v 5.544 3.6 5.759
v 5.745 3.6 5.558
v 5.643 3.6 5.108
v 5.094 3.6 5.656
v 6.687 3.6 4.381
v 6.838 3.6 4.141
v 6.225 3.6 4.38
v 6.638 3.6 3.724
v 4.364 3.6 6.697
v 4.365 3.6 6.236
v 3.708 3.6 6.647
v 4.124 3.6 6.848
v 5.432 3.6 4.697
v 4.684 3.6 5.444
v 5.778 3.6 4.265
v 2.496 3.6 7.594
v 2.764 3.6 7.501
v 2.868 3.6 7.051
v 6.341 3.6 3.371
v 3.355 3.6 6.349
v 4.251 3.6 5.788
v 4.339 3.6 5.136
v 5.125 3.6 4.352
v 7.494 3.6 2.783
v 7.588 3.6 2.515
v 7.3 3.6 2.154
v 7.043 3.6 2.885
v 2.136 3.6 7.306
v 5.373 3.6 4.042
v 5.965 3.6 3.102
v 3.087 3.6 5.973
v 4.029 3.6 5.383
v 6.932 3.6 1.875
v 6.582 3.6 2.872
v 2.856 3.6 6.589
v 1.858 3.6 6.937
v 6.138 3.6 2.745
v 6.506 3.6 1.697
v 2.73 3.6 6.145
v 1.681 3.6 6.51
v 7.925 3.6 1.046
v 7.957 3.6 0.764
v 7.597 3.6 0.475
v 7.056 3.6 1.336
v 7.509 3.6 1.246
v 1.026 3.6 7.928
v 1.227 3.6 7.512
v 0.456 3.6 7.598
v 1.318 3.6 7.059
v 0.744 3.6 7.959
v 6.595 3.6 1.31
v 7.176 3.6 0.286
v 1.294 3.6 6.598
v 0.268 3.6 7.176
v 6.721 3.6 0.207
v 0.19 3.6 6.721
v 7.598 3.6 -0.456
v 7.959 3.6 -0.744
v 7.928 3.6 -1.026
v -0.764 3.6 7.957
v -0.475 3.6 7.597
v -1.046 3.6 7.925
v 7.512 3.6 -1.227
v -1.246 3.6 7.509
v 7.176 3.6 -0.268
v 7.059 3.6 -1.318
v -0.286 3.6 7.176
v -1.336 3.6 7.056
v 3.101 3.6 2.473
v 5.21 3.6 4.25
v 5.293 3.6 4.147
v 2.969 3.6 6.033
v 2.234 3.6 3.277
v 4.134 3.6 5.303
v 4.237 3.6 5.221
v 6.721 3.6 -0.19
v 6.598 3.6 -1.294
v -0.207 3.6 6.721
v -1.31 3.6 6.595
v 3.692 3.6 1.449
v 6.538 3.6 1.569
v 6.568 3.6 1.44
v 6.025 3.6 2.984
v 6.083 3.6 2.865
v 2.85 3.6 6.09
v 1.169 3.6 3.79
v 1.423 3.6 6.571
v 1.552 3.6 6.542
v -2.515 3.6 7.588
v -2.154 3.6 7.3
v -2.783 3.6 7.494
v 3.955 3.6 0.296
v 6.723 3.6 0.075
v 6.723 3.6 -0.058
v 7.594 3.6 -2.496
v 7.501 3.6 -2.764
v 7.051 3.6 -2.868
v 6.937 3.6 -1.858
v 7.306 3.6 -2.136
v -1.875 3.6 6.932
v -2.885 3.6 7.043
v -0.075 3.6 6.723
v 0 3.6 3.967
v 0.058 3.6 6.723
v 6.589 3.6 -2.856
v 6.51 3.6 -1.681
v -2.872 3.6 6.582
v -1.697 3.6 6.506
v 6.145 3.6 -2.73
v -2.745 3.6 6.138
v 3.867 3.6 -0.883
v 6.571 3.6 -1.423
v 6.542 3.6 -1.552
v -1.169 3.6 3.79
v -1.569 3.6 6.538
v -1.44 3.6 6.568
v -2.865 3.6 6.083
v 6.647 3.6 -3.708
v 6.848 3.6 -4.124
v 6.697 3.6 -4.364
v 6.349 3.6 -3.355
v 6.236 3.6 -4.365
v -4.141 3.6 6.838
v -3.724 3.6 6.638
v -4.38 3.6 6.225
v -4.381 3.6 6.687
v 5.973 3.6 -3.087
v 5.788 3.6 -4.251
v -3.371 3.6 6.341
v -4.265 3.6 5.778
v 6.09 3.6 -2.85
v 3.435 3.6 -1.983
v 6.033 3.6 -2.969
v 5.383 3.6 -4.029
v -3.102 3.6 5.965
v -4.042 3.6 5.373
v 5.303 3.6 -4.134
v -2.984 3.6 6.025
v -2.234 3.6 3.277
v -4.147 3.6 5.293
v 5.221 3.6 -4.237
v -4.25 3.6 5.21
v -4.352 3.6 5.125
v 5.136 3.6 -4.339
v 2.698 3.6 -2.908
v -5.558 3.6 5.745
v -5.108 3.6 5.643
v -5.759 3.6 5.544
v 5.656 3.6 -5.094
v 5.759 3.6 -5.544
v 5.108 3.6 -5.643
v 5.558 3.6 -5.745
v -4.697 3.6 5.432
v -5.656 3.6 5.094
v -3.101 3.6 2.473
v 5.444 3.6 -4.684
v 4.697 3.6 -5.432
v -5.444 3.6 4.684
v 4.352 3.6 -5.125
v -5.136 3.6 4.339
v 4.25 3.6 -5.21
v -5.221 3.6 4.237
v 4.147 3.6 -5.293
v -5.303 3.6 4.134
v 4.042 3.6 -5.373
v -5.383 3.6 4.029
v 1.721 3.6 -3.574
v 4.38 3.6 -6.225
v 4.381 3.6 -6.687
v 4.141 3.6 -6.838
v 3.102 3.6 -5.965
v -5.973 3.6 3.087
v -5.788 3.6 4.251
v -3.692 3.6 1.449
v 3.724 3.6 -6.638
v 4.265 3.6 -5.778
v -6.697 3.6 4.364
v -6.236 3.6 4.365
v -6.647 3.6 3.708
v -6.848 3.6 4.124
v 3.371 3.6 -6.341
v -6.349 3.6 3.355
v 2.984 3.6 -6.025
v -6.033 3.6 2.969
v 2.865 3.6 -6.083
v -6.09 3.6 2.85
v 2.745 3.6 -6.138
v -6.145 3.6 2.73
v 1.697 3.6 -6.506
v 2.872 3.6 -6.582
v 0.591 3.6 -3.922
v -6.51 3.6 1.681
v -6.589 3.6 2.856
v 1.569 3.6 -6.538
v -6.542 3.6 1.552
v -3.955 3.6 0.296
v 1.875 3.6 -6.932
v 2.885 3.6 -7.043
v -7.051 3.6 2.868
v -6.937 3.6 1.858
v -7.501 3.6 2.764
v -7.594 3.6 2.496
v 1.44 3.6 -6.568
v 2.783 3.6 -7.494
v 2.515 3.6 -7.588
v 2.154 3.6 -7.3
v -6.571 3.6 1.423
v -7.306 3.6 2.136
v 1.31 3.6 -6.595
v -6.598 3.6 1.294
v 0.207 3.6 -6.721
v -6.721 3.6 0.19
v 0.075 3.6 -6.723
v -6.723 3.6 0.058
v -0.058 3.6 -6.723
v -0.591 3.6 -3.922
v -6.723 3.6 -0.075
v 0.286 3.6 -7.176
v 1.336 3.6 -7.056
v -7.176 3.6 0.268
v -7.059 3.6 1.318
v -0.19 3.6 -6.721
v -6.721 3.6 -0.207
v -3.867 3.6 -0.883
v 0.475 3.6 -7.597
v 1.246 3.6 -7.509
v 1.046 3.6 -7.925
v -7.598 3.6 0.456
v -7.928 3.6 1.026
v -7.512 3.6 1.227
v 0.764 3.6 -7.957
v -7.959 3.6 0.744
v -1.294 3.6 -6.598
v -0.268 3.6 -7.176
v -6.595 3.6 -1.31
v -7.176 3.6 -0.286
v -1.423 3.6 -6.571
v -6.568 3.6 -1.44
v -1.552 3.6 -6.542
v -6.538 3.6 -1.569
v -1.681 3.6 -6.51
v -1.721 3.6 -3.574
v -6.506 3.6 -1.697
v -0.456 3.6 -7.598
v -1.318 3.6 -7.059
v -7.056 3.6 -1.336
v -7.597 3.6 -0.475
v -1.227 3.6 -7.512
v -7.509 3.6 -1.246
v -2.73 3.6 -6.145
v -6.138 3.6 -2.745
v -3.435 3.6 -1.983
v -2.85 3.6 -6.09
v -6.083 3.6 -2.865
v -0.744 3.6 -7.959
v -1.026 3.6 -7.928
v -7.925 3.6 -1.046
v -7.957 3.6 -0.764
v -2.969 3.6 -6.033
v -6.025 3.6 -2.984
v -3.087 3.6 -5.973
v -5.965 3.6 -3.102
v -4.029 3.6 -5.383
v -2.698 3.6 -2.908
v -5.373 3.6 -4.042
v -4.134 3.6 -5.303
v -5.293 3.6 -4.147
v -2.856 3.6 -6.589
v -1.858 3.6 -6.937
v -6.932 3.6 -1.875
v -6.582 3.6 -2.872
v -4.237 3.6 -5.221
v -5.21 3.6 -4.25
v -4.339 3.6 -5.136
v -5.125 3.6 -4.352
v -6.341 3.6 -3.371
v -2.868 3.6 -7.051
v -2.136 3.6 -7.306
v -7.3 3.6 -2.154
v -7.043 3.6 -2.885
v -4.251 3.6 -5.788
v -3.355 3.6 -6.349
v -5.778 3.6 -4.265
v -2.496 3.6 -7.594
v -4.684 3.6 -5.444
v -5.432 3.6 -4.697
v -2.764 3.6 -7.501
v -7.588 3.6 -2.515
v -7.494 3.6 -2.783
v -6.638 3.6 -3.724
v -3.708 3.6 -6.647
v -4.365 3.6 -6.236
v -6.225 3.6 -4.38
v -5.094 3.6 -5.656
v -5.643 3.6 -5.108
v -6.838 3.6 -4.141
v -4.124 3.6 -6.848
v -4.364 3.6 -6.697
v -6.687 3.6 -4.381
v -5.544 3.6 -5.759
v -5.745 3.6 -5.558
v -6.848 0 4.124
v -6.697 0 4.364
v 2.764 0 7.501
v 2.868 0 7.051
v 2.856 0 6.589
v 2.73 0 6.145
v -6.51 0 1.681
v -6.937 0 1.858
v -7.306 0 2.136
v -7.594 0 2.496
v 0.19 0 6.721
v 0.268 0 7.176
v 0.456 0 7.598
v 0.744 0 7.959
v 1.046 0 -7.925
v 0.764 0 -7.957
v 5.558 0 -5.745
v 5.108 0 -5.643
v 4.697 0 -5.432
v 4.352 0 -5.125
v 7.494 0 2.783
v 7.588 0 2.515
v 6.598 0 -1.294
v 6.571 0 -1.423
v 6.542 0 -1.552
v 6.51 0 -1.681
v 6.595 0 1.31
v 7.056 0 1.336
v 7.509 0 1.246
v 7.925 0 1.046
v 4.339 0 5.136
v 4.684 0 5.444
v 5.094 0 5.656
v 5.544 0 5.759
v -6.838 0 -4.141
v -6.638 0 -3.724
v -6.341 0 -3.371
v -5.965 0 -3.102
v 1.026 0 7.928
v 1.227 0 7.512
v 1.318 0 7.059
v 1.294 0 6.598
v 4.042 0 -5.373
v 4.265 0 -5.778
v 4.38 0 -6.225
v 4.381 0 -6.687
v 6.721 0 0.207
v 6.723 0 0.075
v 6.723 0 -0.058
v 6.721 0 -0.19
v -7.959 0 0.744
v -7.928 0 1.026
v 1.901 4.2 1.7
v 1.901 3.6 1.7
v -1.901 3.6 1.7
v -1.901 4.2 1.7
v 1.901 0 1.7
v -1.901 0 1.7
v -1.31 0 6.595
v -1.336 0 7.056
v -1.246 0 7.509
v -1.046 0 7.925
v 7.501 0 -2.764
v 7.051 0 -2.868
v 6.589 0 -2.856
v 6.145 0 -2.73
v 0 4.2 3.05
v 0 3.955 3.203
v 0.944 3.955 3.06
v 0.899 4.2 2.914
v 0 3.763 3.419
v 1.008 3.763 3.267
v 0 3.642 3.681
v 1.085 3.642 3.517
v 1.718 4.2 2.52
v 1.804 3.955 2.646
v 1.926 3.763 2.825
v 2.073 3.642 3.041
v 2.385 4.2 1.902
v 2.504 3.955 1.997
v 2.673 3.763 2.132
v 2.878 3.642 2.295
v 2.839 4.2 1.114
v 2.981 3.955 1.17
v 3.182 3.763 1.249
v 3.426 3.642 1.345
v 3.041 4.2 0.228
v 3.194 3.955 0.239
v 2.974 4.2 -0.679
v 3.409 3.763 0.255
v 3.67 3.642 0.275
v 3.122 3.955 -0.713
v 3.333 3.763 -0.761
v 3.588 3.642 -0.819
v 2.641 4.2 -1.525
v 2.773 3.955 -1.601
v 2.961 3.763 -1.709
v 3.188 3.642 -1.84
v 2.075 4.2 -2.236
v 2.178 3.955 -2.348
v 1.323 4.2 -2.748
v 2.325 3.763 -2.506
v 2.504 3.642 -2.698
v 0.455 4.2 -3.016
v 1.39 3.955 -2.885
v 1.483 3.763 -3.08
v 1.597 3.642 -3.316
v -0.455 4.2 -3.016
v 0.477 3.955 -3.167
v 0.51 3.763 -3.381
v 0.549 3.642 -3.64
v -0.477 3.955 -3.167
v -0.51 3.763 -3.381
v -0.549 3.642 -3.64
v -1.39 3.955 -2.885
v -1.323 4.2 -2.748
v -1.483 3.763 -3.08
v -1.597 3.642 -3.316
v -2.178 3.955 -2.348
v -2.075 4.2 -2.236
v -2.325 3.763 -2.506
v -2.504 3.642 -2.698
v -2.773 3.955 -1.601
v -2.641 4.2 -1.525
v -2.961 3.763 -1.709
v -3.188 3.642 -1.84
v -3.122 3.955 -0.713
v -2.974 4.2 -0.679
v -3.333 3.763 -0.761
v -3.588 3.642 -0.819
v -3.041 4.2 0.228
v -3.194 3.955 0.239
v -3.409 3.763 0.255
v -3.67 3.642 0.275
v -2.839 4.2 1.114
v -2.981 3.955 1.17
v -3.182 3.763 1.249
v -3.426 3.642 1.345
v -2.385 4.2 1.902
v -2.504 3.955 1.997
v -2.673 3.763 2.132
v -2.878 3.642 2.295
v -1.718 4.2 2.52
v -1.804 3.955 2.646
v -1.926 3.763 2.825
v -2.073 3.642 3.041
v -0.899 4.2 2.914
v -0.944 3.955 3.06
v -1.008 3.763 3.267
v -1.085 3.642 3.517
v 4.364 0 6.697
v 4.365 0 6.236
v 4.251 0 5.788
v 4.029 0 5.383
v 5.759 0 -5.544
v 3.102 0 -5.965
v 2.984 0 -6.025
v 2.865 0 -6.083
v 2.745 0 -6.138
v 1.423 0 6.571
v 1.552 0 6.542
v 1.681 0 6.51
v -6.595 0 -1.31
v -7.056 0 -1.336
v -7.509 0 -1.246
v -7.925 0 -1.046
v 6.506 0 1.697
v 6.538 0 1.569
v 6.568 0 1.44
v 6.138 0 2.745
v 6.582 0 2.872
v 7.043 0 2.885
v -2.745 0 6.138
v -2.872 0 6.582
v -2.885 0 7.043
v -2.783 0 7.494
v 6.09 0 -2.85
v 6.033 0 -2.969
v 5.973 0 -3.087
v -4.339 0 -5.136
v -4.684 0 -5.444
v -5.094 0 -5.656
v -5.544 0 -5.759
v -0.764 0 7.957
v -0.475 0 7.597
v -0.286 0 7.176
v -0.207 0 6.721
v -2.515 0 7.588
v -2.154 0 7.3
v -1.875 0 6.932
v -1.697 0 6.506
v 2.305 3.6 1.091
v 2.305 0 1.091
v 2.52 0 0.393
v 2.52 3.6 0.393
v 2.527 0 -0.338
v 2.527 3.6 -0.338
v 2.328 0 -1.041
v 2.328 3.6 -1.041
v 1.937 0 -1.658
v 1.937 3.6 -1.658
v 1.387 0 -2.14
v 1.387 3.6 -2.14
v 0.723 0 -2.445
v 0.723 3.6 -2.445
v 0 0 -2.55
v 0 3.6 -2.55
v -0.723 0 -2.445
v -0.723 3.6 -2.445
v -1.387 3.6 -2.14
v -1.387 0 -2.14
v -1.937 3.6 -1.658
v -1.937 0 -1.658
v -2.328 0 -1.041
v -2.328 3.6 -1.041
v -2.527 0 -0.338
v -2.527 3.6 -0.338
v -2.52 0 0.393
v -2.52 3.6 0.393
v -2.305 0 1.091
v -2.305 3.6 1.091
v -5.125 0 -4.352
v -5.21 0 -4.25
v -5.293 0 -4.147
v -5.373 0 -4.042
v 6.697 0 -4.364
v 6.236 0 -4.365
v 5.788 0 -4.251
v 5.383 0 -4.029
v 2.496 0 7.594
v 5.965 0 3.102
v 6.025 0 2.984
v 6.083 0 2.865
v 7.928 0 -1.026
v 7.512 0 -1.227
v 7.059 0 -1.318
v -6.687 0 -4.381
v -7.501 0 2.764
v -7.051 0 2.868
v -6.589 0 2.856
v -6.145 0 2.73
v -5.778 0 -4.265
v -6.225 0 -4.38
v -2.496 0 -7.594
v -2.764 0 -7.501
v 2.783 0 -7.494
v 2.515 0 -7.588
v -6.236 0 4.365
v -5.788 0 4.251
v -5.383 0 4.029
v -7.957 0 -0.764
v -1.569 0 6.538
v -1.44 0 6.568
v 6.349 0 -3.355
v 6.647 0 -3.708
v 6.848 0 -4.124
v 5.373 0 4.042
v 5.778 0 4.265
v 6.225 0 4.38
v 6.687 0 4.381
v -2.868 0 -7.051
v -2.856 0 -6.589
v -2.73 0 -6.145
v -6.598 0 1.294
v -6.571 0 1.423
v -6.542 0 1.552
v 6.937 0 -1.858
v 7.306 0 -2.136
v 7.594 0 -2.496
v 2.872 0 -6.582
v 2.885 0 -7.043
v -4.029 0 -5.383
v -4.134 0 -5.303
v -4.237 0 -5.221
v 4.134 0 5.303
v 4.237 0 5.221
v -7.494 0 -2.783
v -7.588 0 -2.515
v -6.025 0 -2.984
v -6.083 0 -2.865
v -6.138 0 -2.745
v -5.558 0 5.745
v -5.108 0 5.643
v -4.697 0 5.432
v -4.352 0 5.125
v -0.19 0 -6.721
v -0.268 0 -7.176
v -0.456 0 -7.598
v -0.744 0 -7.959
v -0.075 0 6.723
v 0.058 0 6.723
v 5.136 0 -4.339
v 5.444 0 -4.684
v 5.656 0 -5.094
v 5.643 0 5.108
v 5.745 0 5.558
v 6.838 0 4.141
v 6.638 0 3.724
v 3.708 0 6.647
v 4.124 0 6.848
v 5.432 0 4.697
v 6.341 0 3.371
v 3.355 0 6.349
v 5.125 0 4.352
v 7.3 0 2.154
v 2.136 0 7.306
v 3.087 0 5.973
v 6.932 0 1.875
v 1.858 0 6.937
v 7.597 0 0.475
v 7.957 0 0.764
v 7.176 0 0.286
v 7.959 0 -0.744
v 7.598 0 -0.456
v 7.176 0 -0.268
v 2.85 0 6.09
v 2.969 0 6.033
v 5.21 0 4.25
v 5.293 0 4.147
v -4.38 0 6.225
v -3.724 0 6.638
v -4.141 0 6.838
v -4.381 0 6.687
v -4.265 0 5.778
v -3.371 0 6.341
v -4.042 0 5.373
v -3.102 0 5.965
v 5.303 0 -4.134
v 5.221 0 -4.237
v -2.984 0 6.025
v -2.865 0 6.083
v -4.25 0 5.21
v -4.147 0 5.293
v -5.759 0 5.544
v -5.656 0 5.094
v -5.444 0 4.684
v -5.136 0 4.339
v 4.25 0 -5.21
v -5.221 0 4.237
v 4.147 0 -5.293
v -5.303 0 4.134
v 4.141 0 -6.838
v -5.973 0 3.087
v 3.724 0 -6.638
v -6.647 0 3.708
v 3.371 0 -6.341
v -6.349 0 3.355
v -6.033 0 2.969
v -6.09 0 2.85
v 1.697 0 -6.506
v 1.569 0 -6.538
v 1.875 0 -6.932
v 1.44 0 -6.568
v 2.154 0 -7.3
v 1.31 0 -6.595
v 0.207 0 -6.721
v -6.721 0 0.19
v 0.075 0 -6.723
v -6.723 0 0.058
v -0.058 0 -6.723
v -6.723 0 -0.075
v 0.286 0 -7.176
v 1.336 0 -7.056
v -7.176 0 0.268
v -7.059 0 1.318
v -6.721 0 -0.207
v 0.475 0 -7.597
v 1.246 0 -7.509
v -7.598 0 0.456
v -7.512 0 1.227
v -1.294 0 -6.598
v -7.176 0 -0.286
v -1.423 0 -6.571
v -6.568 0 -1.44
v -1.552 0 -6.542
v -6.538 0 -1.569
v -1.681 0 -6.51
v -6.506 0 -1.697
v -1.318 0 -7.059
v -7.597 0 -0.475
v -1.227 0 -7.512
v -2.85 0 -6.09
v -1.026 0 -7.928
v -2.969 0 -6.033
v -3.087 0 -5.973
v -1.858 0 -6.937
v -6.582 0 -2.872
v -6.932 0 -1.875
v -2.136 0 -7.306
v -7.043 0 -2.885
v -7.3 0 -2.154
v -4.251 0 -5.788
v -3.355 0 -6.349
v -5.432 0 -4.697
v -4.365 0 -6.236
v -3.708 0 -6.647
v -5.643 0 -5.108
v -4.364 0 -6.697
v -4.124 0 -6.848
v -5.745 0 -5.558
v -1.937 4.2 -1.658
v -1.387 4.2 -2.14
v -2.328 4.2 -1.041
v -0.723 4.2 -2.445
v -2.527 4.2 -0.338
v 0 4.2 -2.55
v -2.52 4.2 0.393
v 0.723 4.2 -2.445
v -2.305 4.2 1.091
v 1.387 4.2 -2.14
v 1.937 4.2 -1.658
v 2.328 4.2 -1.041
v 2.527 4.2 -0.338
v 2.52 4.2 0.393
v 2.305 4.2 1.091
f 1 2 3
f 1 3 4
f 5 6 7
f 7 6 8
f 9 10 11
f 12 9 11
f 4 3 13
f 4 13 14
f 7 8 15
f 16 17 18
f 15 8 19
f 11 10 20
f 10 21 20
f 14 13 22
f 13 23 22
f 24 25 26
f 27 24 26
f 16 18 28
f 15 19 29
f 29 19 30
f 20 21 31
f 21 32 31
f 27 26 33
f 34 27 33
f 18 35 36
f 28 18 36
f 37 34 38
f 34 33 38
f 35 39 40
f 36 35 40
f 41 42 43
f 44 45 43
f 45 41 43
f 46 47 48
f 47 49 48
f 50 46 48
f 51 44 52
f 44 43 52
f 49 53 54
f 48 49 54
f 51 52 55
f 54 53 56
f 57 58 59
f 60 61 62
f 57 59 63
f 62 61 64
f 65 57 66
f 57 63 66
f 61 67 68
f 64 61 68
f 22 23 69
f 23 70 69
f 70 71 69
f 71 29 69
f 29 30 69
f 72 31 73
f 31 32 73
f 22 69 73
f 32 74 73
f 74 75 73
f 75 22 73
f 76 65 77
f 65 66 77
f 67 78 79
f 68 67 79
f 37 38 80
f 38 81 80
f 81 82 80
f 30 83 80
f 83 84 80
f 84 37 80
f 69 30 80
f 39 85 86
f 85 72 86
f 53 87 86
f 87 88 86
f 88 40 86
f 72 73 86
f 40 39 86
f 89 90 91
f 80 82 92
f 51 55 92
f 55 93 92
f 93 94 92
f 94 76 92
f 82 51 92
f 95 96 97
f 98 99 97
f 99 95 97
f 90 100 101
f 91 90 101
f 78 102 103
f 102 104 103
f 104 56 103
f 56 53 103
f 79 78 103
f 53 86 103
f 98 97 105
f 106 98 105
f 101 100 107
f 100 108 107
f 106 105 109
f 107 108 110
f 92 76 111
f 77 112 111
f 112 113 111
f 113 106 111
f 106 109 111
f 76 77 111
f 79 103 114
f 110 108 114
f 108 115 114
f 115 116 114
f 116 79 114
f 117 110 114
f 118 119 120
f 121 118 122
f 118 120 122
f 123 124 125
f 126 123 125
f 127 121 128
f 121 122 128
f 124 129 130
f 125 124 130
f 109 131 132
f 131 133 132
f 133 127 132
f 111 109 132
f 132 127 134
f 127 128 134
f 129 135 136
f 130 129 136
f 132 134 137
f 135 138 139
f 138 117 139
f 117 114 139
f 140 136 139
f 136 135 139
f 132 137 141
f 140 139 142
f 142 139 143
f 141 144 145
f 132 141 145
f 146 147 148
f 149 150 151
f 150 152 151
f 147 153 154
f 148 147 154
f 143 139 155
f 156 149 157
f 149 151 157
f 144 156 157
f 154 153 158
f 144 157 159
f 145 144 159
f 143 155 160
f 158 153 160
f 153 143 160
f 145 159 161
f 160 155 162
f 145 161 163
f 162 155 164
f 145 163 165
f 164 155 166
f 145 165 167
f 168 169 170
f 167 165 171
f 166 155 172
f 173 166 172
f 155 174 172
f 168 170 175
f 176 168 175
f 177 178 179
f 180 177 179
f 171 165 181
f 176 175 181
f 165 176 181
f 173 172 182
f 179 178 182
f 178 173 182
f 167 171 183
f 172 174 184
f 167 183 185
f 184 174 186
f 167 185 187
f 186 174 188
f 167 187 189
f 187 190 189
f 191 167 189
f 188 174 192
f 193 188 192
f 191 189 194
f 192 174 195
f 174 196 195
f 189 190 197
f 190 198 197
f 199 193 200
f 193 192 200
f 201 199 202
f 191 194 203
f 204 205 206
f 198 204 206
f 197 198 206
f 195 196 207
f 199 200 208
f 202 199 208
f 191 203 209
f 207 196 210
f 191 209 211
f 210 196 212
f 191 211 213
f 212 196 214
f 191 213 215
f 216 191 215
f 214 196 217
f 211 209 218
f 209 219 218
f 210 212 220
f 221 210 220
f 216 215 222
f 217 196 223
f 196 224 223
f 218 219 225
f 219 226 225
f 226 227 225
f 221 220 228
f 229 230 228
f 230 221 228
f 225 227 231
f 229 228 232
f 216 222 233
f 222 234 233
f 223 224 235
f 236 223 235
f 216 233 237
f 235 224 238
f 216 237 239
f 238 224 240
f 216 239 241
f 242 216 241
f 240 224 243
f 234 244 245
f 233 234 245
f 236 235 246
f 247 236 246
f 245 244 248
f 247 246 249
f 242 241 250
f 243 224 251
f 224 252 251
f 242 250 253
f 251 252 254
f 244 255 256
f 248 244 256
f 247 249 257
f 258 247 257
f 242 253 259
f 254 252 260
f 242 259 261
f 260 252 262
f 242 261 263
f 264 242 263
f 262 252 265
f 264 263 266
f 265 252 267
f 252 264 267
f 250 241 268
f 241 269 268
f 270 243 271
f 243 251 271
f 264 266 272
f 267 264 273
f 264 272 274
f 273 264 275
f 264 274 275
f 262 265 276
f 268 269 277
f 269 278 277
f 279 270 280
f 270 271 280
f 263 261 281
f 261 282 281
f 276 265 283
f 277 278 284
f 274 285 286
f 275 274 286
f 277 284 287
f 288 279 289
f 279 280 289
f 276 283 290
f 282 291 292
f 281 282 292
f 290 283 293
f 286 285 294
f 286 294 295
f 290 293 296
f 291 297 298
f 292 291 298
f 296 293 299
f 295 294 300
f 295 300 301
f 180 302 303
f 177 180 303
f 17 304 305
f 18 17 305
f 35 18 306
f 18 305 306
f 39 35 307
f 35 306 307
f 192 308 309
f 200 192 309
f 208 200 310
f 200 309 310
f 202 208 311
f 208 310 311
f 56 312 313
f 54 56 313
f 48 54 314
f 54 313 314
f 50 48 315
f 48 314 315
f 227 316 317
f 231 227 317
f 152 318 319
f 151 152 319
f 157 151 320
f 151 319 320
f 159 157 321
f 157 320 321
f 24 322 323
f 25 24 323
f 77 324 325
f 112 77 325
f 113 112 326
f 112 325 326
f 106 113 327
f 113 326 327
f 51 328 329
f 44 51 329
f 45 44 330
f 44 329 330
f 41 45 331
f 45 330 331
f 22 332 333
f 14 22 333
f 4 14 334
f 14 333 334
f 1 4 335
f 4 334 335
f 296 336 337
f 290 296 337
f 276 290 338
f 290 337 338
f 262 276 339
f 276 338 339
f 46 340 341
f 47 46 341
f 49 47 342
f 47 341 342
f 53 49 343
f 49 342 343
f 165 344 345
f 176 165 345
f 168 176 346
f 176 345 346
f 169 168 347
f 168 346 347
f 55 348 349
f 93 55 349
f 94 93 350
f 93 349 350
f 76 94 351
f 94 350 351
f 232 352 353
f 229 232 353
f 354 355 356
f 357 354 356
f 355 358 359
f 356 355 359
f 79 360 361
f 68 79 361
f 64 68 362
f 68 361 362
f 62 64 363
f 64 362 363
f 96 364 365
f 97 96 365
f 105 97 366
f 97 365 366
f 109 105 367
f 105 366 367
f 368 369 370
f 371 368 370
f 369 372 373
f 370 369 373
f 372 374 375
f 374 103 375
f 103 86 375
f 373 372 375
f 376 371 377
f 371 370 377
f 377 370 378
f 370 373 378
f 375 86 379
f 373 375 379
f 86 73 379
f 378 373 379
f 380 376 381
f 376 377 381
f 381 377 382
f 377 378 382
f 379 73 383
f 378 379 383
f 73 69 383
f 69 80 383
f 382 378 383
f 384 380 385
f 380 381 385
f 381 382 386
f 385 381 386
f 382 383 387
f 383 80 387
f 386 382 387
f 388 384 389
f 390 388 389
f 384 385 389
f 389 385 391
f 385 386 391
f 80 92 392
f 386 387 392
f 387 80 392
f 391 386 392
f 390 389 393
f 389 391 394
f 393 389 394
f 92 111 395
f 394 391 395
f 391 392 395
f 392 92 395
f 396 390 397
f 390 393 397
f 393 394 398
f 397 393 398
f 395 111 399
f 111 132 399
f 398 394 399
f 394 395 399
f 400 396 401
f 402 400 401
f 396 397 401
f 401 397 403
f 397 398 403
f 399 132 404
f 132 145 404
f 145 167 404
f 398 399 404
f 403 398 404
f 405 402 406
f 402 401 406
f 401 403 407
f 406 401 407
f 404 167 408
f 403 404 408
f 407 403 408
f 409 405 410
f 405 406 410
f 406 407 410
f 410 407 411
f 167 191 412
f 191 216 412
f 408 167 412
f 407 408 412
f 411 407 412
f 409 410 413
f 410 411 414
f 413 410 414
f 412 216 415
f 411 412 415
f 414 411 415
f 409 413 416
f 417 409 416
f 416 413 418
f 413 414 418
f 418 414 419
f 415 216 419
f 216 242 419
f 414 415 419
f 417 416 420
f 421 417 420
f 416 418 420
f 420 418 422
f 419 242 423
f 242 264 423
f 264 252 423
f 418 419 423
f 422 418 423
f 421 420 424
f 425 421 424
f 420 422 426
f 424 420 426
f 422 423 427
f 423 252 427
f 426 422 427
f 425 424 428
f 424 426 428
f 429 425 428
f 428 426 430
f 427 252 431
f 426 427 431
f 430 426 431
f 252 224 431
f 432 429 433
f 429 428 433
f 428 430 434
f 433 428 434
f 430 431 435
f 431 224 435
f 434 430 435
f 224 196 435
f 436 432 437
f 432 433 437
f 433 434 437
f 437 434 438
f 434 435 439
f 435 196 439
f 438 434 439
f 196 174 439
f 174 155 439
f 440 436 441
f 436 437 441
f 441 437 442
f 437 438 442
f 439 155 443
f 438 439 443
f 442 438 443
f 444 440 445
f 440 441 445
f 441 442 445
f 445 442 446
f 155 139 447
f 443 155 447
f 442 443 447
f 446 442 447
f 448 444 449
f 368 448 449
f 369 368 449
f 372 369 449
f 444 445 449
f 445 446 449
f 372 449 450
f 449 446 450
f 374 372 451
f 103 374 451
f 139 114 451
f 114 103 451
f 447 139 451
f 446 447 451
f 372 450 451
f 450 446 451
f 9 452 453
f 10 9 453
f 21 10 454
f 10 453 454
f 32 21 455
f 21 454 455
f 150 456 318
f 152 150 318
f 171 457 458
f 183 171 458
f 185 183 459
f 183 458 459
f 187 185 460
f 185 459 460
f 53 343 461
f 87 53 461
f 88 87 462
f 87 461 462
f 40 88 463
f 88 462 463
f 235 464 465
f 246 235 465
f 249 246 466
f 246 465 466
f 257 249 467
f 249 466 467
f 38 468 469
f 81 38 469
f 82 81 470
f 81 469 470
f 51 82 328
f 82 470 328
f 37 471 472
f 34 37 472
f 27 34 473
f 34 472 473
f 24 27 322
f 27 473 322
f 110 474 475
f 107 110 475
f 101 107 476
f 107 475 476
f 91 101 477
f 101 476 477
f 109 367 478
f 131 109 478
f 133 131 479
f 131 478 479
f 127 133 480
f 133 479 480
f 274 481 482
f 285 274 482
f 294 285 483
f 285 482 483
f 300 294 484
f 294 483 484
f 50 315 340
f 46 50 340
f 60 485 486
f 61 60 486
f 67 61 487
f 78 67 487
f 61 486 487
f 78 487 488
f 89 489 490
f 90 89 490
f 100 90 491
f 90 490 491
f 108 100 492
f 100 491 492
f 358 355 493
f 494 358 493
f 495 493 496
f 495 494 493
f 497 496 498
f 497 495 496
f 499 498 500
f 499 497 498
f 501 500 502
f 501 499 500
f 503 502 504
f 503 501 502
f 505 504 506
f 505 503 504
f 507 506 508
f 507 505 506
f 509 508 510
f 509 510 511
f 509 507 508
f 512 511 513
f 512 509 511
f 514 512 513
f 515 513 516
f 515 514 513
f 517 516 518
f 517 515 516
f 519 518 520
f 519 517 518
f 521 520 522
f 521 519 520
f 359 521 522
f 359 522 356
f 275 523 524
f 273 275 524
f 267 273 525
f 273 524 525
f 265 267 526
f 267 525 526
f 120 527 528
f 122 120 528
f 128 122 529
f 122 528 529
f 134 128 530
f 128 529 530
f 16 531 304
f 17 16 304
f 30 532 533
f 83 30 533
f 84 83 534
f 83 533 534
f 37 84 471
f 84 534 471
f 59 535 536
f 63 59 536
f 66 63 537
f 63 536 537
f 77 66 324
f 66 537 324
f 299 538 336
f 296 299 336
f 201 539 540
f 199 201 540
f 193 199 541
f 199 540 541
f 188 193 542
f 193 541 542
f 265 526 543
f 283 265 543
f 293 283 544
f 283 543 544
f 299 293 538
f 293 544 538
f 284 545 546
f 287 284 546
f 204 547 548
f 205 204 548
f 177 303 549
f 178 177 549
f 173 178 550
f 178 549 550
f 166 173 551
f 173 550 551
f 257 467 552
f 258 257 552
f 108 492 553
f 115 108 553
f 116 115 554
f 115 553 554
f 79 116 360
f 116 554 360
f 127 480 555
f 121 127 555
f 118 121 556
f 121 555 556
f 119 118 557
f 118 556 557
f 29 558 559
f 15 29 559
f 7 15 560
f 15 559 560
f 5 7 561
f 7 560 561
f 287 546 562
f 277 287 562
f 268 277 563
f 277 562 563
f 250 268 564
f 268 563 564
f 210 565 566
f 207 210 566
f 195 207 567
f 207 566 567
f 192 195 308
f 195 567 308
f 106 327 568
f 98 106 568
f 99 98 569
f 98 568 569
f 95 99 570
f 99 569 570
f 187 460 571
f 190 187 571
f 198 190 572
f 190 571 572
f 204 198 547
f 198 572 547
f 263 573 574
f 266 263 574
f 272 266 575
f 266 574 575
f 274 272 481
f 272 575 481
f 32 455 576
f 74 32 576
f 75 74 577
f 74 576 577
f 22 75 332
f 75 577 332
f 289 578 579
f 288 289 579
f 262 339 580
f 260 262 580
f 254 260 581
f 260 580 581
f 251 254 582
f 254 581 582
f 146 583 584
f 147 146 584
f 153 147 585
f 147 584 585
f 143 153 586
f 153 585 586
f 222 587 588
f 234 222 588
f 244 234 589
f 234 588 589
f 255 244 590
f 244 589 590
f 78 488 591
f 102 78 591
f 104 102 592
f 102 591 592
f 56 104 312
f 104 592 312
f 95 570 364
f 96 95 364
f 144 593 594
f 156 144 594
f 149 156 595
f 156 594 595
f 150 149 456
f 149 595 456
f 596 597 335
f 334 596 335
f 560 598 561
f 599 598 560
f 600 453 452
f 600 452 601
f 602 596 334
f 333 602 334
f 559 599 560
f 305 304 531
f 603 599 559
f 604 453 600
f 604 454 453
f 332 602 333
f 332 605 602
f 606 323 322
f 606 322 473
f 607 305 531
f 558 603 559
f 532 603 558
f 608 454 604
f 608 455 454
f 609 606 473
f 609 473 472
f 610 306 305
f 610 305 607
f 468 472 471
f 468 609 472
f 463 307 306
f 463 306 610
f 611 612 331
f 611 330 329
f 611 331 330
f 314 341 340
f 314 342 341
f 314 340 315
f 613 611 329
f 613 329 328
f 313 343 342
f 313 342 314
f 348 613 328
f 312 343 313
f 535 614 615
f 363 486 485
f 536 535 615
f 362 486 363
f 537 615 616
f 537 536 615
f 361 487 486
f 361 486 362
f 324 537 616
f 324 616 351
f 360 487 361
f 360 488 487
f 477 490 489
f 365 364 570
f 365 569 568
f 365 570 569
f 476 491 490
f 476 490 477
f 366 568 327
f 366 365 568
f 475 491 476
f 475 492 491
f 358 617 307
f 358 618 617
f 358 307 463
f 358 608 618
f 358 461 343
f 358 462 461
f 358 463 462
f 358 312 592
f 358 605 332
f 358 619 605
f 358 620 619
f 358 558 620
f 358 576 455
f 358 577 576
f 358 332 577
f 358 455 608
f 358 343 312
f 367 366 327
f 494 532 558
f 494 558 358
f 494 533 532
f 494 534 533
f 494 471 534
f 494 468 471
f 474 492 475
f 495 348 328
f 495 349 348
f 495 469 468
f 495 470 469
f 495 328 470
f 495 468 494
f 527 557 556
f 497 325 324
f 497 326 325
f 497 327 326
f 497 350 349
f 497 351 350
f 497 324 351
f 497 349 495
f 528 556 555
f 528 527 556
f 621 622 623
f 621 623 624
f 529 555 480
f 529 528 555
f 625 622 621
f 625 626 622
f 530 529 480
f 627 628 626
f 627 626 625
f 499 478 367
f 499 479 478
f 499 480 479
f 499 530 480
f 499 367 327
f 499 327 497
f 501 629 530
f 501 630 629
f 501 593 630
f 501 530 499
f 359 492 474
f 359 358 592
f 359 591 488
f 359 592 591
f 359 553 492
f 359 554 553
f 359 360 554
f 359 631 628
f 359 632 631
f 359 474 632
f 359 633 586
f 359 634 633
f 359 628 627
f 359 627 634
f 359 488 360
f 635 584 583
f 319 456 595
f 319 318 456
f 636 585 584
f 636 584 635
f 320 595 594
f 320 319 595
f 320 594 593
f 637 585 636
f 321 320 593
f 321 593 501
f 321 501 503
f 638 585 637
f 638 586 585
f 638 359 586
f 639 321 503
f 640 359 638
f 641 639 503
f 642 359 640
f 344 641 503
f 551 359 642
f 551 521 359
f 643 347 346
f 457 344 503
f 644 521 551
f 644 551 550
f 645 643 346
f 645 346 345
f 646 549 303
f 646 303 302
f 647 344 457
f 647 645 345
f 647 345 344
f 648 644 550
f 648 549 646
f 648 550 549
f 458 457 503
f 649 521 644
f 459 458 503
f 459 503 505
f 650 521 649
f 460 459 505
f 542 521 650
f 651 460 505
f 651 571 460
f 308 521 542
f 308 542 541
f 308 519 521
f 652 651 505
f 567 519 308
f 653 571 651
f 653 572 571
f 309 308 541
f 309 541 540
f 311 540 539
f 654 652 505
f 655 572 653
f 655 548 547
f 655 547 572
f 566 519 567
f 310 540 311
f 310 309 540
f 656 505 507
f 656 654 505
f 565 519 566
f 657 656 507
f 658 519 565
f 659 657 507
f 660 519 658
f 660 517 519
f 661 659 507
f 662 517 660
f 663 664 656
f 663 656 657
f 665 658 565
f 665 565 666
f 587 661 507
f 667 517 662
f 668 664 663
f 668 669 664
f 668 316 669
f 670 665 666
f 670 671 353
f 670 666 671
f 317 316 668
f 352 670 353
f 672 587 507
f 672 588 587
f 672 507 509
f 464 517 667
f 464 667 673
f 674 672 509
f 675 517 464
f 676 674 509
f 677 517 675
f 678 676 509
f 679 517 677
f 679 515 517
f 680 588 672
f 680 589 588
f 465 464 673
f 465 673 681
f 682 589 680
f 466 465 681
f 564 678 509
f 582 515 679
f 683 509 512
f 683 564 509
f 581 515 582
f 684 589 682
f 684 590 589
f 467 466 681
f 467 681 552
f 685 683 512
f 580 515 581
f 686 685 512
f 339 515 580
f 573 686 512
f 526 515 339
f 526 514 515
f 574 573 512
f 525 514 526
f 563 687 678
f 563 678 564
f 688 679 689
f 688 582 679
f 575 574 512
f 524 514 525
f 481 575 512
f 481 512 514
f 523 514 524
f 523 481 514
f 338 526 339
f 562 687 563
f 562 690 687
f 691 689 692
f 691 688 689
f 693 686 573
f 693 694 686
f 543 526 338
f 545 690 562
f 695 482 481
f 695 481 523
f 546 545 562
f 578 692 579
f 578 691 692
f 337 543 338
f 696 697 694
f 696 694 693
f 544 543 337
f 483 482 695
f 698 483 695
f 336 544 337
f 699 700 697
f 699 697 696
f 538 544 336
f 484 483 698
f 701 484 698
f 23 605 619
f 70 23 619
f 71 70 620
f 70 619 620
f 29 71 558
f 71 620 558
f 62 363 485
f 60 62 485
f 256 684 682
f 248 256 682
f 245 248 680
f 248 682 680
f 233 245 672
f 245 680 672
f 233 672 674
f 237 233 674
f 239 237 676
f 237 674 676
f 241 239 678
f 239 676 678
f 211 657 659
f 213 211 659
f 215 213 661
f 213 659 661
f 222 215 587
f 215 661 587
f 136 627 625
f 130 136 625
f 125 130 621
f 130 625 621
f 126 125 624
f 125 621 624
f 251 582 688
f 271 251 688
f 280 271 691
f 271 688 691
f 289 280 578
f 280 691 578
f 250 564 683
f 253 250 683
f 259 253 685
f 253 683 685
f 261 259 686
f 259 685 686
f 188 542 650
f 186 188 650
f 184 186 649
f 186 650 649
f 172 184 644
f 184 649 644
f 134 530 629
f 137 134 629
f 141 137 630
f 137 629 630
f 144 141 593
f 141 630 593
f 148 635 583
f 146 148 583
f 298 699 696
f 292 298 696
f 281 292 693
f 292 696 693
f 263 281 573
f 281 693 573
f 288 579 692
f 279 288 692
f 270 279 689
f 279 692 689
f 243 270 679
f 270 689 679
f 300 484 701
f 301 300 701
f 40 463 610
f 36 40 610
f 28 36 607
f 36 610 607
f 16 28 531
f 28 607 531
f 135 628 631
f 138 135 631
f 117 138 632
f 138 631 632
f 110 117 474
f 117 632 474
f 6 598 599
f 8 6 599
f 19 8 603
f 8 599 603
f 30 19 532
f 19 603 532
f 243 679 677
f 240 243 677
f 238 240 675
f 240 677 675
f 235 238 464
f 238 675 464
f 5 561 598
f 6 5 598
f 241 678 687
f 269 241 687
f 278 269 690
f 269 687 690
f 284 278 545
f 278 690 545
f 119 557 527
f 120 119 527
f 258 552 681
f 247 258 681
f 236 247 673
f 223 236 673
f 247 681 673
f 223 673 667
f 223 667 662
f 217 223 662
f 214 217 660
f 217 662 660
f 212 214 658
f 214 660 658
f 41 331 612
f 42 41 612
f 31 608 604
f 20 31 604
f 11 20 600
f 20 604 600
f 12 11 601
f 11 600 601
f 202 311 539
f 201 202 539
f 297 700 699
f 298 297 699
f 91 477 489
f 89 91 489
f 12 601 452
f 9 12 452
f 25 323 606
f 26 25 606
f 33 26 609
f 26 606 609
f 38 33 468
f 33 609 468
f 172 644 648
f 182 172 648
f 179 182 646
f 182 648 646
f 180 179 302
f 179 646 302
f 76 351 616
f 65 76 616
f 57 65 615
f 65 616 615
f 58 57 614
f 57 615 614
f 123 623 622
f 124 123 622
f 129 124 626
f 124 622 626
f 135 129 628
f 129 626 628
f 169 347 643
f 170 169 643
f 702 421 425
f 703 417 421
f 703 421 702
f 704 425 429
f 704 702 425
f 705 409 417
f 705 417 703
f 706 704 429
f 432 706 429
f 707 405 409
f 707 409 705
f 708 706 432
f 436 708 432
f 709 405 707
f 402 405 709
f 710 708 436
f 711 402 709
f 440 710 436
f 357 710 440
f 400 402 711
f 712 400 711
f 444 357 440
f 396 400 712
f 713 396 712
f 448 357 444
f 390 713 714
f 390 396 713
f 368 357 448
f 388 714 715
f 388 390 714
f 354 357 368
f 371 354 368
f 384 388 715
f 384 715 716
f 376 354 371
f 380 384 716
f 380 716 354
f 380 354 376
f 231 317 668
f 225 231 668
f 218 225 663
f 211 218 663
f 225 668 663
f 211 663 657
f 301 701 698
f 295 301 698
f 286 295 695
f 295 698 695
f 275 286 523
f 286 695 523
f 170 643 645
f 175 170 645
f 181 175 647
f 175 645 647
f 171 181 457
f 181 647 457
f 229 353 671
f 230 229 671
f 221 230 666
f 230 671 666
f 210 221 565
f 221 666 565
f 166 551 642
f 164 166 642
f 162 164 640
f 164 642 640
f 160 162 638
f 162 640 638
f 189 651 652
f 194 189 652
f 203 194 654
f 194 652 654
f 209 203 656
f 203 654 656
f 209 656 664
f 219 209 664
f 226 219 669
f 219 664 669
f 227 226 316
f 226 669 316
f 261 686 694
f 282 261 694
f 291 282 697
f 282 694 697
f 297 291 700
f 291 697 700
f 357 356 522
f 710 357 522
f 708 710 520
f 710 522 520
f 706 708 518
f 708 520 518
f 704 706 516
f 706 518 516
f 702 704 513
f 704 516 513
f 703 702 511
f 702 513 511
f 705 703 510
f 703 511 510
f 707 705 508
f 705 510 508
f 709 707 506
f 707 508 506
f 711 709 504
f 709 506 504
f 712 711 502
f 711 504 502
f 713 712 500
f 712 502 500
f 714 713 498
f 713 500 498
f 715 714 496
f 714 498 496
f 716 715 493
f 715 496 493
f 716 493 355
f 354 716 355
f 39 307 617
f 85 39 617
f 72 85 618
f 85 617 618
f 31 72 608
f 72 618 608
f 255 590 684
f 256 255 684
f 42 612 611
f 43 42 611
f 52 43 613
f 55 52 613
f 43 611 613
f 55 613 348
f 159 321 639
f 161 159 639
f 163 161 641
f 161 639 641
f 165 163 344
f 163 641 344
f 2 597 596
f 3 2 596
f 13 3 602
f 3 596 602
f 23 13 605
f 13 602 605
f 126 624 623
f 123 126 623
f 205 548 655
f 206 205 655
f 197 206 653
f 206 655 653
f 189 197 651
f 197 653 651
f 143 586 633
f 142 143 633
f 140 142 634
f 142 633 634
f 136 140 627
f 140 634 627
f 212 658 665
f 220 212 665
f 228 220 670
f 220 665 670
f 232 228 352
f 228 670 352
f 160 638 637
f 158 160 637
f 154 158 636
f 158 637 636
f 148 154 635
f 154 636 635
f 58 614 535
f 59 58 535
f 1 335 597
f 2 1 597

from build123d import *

# Parameters (mm, degrees)
SKETCH1_R           = 2.55
BOSS_EXTRUDE2_DEPTH = 3.6
BOSS_EXTRUDE3_START = -3.6
BOSS_EXTRUDE3_DEPTH = 3.6
SKETCH5_R           = 3.05
BOSS_EXTRUDE6_DEPTH = 0.6
FILLET3_R           = 1


with BuildPart() as part:
    # Sketch1 → Boss-Extrude2 (new body)
    with BuildSketch(Plane(origin=(0, 0, 0), x_dir=(1, 0, 0), z_dir=(0, 1, 0))):
        with BuildLine():
            ThreePointArc((3.087277962, -5.973051053), (3.521946978, -6.509464465), (4.123690803, -6.847962431))
            Line((4.123690803, -6.847962431), (4.363885613, -6.697456058))
            ThreePointArc((4.363885613, -6.697456058), (4.321717278, -6.00832738), (4.02858155, -5.38322903))
            ThreePointArc((4.02858155, -5.38322903), (4.185613137, -5.262059175), (4.339002356, -5.136310217))
            ThreePointArc((4.339002356, -5.136310217), (4.882136527, -5.56255167), (5.544116261, -5.758662187))
            Line((5.544116261, -5.758662187), (5.744798067, -5.55848095))
            ThreePointArc((5.744798067, -5.55848095), (5.550341423, -4.896013504), (5.125457751, -4.35181651))
            ThreePointArc((5.125457751, -4.35181651), (5.251589399, -4.198741821), (5.373151055, -4.042013339))
            ThreePointArc((5.373151055, -4.042013339), (5.997515364, -4.336709306), (6.686536579, -4.380598575))
            Line((6.686536579, -4.380598575), (6.837642357, -4.140780396))
            ThreePointArc((6.837642357, -4.140780396), (6.500648273, -3.538193066), (5.965322098, -3.102185738))
            ThreePointArc((5.965322098, -3.102185738), (6.05422904, -2.924882019), (6.137867523, -2.745033035))
            ThreePointArc((6.137867523, -2.745033035), (6.812153737, -2.893406229), (7.493666033, -2.782873458))
            Line((7.493666033, -2.782873458), (7.587618709, -2.515443823))
            ThreePointArc((7.587618709, -2.515443823), (7.124985474, -2.002952854), (6.506060286, -1.696998421))
            ThreePointArc((6.506060286, -1.696998421), (6.553284356, -1.50435642), (6.594805684, -1.310405312))
            ThreePointArc((6.594805684, -1.310405312), (7.285202277, -1.305015683), (7.925031781, -1.045603446))
            Line((7.925031781, -1.045603446), (7.957120175, -0.763972393))
            ThreePointArc((7.957120175, -0.763972393), (7.392046152, -0.367276222), (6.720557445, -0.206716516))
            ThreePointArc((6.720557445, -0.206716516), (6.723730631, -0.008396108), (6.721052751, 0.189931605))
            ThreePointArc((6.721052751, 0.189931605), (7.392940354, 0.3488138), (7.959003343, 0.744097489))
            Line((7.959003343, 0.744097489), (7.927618409, 1.025807803))
            ThreePointArc((7.927618409, 1.025807803), (7.28843877, 1.286817174), (6.598057791, 1.293931018))
            ThreePointArc((6.598057791, 1.293931018), (6.557020976, 1.487985219), (6.510278168, 1.680744559))
            ThreePointArc((6.510278168, 1.680744559), (7.129965532, 1.985152302), (7.593877244, 2.496486269))
            Line((7.593877244, 2.496486269), (7.500592754, 2.764149712))
            ThreePointArc((7.500592754, 2.764149712), (6.819358634, 2.876384183), (6.144703968, 2.729695448))
            ThreePointArc((6.144703968, 2.729695448), (6.061514909, 2.909752755), (5.973051053, 3.087277962))
            ThreePointArc((5.973051053, 3.087277962), (6.509464465, 3.521946978), (6.847962431, 4.123690803))
            Line((6.847962431, 4.123690803), (6.697456058, 4.363885613))
            ThreePointArc((6.697456058, 4.363885613), (6.00832738, 4.321717278), (5.38322903, 4.02858155))
            ThreePointArc((5.38322903, 4.02858155), (5.262059175, 4.185613137), (5.136310217, 4.339002356))
            ThreePointArc((5.136310217, 4.339002356), (5.56255167, 4.882136527), (5.758662187, 5.544116261))
            Line((5.758662187, 5.544116261), (5.55848095, 5.744798067))
            ThreePointArc((5.55848095, 5.744798067), (4.896013504, 5.550341423), (4.35181651, 5.125457751))
            ThreePointArc((4.35181651, 5.125457751), (4.198741821, 5.251589399), (4.042013339, 5.373151055))
            ThreePointArc((4.042013339, 5.373151055), (4.336709306, 5.997515364), (4.380598575, 6.686536579))
            Line((4.380598575, 6.686536579), (4.140780396, 6.837642357))
            ThreePointArc((4.140780396, 6.837642357), (3.538193066, 6.500648273), (3.102185738, 5.965322098))
            ThreePointArc((3.102185738, 5.965322098), (2.924882019, 6.05422904), (2.745033035, 6.137867523))
            ThreePointArc((2.745033035, 6.137867523), (2.893406229, 6.812153737), (2.782873458, 7.493666033))
            Line((2.782873458, 7.493666033), (2.515443823, 7.587618709))
            ThreePointArc((2.515443823, 7.587618709), (2.002952854, 7.124985474), (1.696998421, 6.506060286))
            ThreePointArc((1.696998421, 6.506060286), (1.50435642, 6.553284356), (1.310405312, 6.594805684))
            ThreePointArc((1.310405312, 6.594805684), (1.305015683, 7.285202277), (1.045603446, 7.925031781))
            Line((1.045603446, 7.925031781), (0.763972393, 7.957120175))
            ThreePointArc((0.763972393, 7.957120175), (0.367276222, 7.392046152), (0.206716516, 6.720557445))
            ThreePointArc((0.206716516, 6.720557445), (0.008396108, 6.723730631), (-0.189931605, 6.721052751))
            ThreePointArc((-0.189931605, 6.721052751), (-0.3488138, 7.392940354), (-0.744097489, 7.959003343))
            Line((-0.744097489, 7.959003343), (-1.025807803, 7.927618409))
            ThreePointArc((-1.025807803, 7.927618409), (-1.286817174, 7.28843877), (-1.293931018, 6.598057791))
            ThreePointArc((-1.293931018, 6.598057791), (-1.487985219, 6.557020976), (-1.680744559, 6.510278168))
            ThreePointArc((-1.680744559, 6.510278168), (-1.985152302, 7.129965532), (-2.496486269, 7.593877244))
            Line((-2.496486269, 7.593877244), (-2.764149712, 7.500592754))
            ThreePointArc((-2.764149712, 7.500592754), (-2.876384183, 6.819358634), (-2.729695448, 6.144703968))
            ThreePointArc((-2.729695448, 6.144703968), (-2.909752755, 6.061514909), (-3.087277962, 5.973051053))
            ThreePointArc((-3.087277962, 5.973051053), (-3.521946978, 6.509464465), (-4.123690803, 6.847962431))
            Line((-4.123690803, 6.847962431), (-4.363885613, 6.697456058))
            ThreePointArc((-4.363885613, 6.697456058), (-4.321717278, 6.00832738), (-4.02858155, 5.38322903))
            ThreePointArc((-4.02858155, 5.38322903), (-4.185613137, 5.262059175), (-4.339002356, 5.136310217))
            ThreePointArc((-4.339002356, 5.136310217), (-4.882136527, 5.56255167), (-5.544116261, 5.758662187))
            Line((-5.544116261, 5.758662187), (-5.744798067, 5.55848095))
            ThreePointArc((-5.744798067, 5.55848095), (-5.550341423, 4.896013504), (-5.125457751, 4.35181651))
            ThreePointArc((-5.125457751, 4.35181651), (-5.251589399, 4.198741821), (-5.373151055, 4.042013339))
            ThreePointArc((-5.373151055, 4.042013339), (-5.997515364, 4.336709306), (-6.686536579, 4.380598575))
            Line((-6.686536579, 4.380598575), (-6.837642357, 4.140780396))
            ThreePointArc((-6.837642357, 4.140780396), (-6.500648273, 3.538193066), (-5.965322098, 3.102185738))
            ThreePointArc((-5.965322098, 3.102185738), (-6.05422904, 2.924882019), (-6.137867523, 2.745033035))
            ThreePointArc((-6.137867523, 2.745033035), (-6.812153737, 2.893406229), (-7.493666033, 2.782873458))
            Line((-7.493666033, 2.782873458), (-7.587618709, 2.515443823))
            ThreePointArc((-7.587618709, 2.515443823), (-7.124985474, 2.002952854), (-6.506060286, 1.696998421))
            ThreePointArc((-6.506060286, 1.696998421), (-6.553284356, 1.50435642), (-6.594805684, 1.310405312))
            ThreePointArc((-6.594805684, 1.310405312), (-7.285202277, 1.305015683), (-7.925031781, 1.045603446))
            Line((-7.925031781, 1.045603446), (-7.957120175, 0.763972393))
            ThreePointArc((-7.957120175, 0.763972393), (-7.392046152, 0.367276222), (-6.720557445, 0.206716516))
            ThreePointArc((-6.720557445, 0.206716516), (-6.723730631, 0.008396108), (-6.721052751, -0.189931605))
            ThreePointArc((-6.721052751, -0.189931605), (-7.392940354, -0.3488138), (-7.959003343, -0.744097489))
            Line((-7.959003343, -0.744097489), (-7.927618409, -1.025807803))
            ThreePointArc((-7.927618409, -1.025807803), (-7.28843877, -1.286817174), (-6.598057791, -1.293931018))
            ThreePointArc((-6.598057791, -1.293931018), (-6.557020976, -1.487985219), (-6.510278168, -1.680744559))
            ThreePointArc((-6.510278168, -1.680744559), (-7.129965532, -1.985152302), (-7.593877244, -2.496486269))
            Line((-7.593877244, -2.496486269), (-7.500592754, -2.764149712))
            ThreePointArc((-7.500592754, -2.764149712), (-6.819358634, -2.876384183), (-6.144703968, -2.729695448))
            ThreePointArc((-6.144703968, -2.729695448), (-6.061514909, -2.909752755), (-5.973051053, -3.087277962))
            ThreePointArc((-5.973051053, -3.087277962), (-6.509464465, -3.521946978), (-6.847962431, -4.123690803))
            Line((-6.847962431, -4.123690803), (-6.697456058, -4.363885613))
            ThreePointArc((-6.697456058, -4.363885613), (-6.00832738, -4.321717278), (-5.38322903, -4.02858155))
            ThreePointArc((-5.38322903, -4.02858155), (-5.262059175, -4.185613137), (-5.136310217, -4.339002356))
            ThreePointArc((-5.136310217, -4.339002356), (-5.56255167, -4.882136527), (-5.758662187, -5.544116261))
            Line((-5.758662187, -5.544116261), (-5.55848095, -5.744798067))
            ThreePointArc((-5.55848095, -5.744798067), (-4.896013504, -5.550341423), (-4.35181651, -5.125457751))
            ThreePointArc((-4.35181651, -5.125457751), (-4.198741821, -5.251589399), (-4.042013339, -5.373151055))
            ThreePointArc((-4.042013339, -5.373151055), (-4.336709306, -5.997515364), (-4.380598575, -6.686536579))
            Line((-4.380598575, -6.686536579), (-4.140780396, -6.837642357))
            ThreePointArc((-4.140780396, -6.837642357), (-3.538193066, -6.500648273), (-3.102185738, -5.965322098))
            ThreePointArc((-3.102185738, -5.965322098), (-2.924882019, -6.05422904), (-2.745033035, -6.137867523))
            ThreePointArc((-2.745033035, -6.137867523), (-2.893406229, -6.812153737), (-2.782873458, -7.493666033))
            Line((-2.782873458, -7.493666033), (-2.515443823, -7.587618709))
            ThreePointArc((-2.515443823, -7.587618709), (-2.002952854, -7.124985474), (-1.696998421, -6.506060286))
            ThreePointArc((-1.696998421, -6.506060286), (-1.50435642, -6.553284356), (-1.310405312, -6.594805684))
            ThreePointArc((-1.310405312, -6.594805684), (-1.305015683, -7.285202277), (-1.045603446, -7.925031781))
            Line((-1.045603446, -7.925031781), (-0.763972393, -7.957120175))
            ThreePointArc((-0.763972393, -7.957120175), (-0.367276222, -7.392046152), (-0.206716516, -6.720557445))
            ThreePointArc((-0.206716516, -6.720557445), (-0.008396108, -6.723730631), (0.189931605, -6.721052751))
            ThreePointArc((0.189931605, -6.721052751), (0.3488138, -7.392940354), (0.744097489, -7.959003343))
            Line((0.744097489, -7.959003343), (1.025807803, -7.927618409))
            ThreePointArc((1.025807803, -7.927618409), (1.286817174, -7.28843877), (1.293931018, -6.598057791))
            ThreePointArc((1.293931018, -6.598057791), (1.487985219, -6.557020976), (1.680744559, -6.510278168))
            ThreePointArc((1.680744559, -6.510278168), (1.985152302, -7.129965532), (2.496486269, -7.593877244))
            Line((2.496486269, -7.593877244), (2.764149712, -7.500592754))
            ThreePointArc((2.764149712, -7.500592754), (2.876384183, -6.819358634), (2.729695448, -6.144703968))
            ThreePointArc((2.729695448, -6.144703968), (2.909752755, -6.061514909), (3.087277962, -5.973051053))
        make_face()
        with Locations(Location((0, 0, 0), (0, 0, 270))):
            Circle(SKETCH1_R, mode=Mode.SUBTRACT)
    extrude(amount=BOSS_EXTRUDE2_DEPTH)

    # Sketch2 → Boss-Extrude3 (add)
    with BuildSketch(Plane(origin=(0, 3.6, 0), x_dir=(1, 0, 0), z_dir=(0, 1, 0)).offset(BOSS_EXTRUDE3_START)):
        with BuildLine():
            Line((-1.900657781, -1.7), (1.900657781, -1.7))
            ThreePointArc((1.900657781, -1.7), (0, -2.55), (-1.900657781, -1.7))
        make_face()
    extrude(amount=BOSS_EXTRUDE3_DEPTH)

    # Sketch5 → Boss-Extrude6 (add)
    with BuildSketch(Plane(origin=(0, 3.6, 0), x_dir=(1, 0, 0), z_dir=(0, 1, 0))):
        with Locations(Location((0, 0, 0), (0, 0, 270))):
            Circle(SKETCH5_R)
        with BuildLine():
            Line((1.900657781, -1.7), (-1.900657781, -1.7))
            ThreePointArc((-1.900657781, -1.7), (0, 2.55), (1.900657781, -1.7))
        make_face(mode=Mode.SUBTRACT)
    extrude(amount=BOSS_EXTRUDE6_DEPTH)

    # Fillet3
    # the kernel refuses this fillet: 1 mm, written as the material it adds along each edge
    with BuildSketch(Plane(origin=(0, 3.6, 0), x_dir=(0, 0, 1), z_dir=(-1, 0, 0))) as fillet3_piece_1:
        with BuildLine():
            CenterArc((3.966515139, 1), FILLET3_R, 203.578178478, 66.421821522)
            Line((3.05, 0.6), (3.031669697, 0.592))
            ThreePointArc((3.031669697, 0.592), (3.03, 0.3), (3.03, 0))
            Line((3.03, 0), (3.05, -0.02))
            Line((3.05, -0.02), (3.966515139, -0.02))
            Line((3.966515139, -0.02), (3.966515139, 0))
        make_face()
    revolve(axis=Axis((0, 3.6, 0), (0, 1, 0)))


solid = part.part
